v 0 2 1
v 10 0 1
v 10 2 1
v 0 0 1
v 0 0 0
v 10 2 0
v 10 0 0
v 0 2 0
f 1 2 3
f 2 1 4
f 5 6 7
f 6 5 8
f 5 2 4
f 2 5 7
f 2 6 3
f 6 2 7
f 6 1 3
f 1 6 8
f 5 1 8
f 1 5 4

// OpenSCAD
export_2d = false; 
L = 10.0;
W = 2.0;

module PhononicCrystal() {
    cube([L, W, 1]);
}

if (export_2d) {
    projection(cut=true) translate([0, 0, -0.5]) 
        PhononicCrystal($fn=30);
} else {
    PhononicCrystal($fn=100);
}
